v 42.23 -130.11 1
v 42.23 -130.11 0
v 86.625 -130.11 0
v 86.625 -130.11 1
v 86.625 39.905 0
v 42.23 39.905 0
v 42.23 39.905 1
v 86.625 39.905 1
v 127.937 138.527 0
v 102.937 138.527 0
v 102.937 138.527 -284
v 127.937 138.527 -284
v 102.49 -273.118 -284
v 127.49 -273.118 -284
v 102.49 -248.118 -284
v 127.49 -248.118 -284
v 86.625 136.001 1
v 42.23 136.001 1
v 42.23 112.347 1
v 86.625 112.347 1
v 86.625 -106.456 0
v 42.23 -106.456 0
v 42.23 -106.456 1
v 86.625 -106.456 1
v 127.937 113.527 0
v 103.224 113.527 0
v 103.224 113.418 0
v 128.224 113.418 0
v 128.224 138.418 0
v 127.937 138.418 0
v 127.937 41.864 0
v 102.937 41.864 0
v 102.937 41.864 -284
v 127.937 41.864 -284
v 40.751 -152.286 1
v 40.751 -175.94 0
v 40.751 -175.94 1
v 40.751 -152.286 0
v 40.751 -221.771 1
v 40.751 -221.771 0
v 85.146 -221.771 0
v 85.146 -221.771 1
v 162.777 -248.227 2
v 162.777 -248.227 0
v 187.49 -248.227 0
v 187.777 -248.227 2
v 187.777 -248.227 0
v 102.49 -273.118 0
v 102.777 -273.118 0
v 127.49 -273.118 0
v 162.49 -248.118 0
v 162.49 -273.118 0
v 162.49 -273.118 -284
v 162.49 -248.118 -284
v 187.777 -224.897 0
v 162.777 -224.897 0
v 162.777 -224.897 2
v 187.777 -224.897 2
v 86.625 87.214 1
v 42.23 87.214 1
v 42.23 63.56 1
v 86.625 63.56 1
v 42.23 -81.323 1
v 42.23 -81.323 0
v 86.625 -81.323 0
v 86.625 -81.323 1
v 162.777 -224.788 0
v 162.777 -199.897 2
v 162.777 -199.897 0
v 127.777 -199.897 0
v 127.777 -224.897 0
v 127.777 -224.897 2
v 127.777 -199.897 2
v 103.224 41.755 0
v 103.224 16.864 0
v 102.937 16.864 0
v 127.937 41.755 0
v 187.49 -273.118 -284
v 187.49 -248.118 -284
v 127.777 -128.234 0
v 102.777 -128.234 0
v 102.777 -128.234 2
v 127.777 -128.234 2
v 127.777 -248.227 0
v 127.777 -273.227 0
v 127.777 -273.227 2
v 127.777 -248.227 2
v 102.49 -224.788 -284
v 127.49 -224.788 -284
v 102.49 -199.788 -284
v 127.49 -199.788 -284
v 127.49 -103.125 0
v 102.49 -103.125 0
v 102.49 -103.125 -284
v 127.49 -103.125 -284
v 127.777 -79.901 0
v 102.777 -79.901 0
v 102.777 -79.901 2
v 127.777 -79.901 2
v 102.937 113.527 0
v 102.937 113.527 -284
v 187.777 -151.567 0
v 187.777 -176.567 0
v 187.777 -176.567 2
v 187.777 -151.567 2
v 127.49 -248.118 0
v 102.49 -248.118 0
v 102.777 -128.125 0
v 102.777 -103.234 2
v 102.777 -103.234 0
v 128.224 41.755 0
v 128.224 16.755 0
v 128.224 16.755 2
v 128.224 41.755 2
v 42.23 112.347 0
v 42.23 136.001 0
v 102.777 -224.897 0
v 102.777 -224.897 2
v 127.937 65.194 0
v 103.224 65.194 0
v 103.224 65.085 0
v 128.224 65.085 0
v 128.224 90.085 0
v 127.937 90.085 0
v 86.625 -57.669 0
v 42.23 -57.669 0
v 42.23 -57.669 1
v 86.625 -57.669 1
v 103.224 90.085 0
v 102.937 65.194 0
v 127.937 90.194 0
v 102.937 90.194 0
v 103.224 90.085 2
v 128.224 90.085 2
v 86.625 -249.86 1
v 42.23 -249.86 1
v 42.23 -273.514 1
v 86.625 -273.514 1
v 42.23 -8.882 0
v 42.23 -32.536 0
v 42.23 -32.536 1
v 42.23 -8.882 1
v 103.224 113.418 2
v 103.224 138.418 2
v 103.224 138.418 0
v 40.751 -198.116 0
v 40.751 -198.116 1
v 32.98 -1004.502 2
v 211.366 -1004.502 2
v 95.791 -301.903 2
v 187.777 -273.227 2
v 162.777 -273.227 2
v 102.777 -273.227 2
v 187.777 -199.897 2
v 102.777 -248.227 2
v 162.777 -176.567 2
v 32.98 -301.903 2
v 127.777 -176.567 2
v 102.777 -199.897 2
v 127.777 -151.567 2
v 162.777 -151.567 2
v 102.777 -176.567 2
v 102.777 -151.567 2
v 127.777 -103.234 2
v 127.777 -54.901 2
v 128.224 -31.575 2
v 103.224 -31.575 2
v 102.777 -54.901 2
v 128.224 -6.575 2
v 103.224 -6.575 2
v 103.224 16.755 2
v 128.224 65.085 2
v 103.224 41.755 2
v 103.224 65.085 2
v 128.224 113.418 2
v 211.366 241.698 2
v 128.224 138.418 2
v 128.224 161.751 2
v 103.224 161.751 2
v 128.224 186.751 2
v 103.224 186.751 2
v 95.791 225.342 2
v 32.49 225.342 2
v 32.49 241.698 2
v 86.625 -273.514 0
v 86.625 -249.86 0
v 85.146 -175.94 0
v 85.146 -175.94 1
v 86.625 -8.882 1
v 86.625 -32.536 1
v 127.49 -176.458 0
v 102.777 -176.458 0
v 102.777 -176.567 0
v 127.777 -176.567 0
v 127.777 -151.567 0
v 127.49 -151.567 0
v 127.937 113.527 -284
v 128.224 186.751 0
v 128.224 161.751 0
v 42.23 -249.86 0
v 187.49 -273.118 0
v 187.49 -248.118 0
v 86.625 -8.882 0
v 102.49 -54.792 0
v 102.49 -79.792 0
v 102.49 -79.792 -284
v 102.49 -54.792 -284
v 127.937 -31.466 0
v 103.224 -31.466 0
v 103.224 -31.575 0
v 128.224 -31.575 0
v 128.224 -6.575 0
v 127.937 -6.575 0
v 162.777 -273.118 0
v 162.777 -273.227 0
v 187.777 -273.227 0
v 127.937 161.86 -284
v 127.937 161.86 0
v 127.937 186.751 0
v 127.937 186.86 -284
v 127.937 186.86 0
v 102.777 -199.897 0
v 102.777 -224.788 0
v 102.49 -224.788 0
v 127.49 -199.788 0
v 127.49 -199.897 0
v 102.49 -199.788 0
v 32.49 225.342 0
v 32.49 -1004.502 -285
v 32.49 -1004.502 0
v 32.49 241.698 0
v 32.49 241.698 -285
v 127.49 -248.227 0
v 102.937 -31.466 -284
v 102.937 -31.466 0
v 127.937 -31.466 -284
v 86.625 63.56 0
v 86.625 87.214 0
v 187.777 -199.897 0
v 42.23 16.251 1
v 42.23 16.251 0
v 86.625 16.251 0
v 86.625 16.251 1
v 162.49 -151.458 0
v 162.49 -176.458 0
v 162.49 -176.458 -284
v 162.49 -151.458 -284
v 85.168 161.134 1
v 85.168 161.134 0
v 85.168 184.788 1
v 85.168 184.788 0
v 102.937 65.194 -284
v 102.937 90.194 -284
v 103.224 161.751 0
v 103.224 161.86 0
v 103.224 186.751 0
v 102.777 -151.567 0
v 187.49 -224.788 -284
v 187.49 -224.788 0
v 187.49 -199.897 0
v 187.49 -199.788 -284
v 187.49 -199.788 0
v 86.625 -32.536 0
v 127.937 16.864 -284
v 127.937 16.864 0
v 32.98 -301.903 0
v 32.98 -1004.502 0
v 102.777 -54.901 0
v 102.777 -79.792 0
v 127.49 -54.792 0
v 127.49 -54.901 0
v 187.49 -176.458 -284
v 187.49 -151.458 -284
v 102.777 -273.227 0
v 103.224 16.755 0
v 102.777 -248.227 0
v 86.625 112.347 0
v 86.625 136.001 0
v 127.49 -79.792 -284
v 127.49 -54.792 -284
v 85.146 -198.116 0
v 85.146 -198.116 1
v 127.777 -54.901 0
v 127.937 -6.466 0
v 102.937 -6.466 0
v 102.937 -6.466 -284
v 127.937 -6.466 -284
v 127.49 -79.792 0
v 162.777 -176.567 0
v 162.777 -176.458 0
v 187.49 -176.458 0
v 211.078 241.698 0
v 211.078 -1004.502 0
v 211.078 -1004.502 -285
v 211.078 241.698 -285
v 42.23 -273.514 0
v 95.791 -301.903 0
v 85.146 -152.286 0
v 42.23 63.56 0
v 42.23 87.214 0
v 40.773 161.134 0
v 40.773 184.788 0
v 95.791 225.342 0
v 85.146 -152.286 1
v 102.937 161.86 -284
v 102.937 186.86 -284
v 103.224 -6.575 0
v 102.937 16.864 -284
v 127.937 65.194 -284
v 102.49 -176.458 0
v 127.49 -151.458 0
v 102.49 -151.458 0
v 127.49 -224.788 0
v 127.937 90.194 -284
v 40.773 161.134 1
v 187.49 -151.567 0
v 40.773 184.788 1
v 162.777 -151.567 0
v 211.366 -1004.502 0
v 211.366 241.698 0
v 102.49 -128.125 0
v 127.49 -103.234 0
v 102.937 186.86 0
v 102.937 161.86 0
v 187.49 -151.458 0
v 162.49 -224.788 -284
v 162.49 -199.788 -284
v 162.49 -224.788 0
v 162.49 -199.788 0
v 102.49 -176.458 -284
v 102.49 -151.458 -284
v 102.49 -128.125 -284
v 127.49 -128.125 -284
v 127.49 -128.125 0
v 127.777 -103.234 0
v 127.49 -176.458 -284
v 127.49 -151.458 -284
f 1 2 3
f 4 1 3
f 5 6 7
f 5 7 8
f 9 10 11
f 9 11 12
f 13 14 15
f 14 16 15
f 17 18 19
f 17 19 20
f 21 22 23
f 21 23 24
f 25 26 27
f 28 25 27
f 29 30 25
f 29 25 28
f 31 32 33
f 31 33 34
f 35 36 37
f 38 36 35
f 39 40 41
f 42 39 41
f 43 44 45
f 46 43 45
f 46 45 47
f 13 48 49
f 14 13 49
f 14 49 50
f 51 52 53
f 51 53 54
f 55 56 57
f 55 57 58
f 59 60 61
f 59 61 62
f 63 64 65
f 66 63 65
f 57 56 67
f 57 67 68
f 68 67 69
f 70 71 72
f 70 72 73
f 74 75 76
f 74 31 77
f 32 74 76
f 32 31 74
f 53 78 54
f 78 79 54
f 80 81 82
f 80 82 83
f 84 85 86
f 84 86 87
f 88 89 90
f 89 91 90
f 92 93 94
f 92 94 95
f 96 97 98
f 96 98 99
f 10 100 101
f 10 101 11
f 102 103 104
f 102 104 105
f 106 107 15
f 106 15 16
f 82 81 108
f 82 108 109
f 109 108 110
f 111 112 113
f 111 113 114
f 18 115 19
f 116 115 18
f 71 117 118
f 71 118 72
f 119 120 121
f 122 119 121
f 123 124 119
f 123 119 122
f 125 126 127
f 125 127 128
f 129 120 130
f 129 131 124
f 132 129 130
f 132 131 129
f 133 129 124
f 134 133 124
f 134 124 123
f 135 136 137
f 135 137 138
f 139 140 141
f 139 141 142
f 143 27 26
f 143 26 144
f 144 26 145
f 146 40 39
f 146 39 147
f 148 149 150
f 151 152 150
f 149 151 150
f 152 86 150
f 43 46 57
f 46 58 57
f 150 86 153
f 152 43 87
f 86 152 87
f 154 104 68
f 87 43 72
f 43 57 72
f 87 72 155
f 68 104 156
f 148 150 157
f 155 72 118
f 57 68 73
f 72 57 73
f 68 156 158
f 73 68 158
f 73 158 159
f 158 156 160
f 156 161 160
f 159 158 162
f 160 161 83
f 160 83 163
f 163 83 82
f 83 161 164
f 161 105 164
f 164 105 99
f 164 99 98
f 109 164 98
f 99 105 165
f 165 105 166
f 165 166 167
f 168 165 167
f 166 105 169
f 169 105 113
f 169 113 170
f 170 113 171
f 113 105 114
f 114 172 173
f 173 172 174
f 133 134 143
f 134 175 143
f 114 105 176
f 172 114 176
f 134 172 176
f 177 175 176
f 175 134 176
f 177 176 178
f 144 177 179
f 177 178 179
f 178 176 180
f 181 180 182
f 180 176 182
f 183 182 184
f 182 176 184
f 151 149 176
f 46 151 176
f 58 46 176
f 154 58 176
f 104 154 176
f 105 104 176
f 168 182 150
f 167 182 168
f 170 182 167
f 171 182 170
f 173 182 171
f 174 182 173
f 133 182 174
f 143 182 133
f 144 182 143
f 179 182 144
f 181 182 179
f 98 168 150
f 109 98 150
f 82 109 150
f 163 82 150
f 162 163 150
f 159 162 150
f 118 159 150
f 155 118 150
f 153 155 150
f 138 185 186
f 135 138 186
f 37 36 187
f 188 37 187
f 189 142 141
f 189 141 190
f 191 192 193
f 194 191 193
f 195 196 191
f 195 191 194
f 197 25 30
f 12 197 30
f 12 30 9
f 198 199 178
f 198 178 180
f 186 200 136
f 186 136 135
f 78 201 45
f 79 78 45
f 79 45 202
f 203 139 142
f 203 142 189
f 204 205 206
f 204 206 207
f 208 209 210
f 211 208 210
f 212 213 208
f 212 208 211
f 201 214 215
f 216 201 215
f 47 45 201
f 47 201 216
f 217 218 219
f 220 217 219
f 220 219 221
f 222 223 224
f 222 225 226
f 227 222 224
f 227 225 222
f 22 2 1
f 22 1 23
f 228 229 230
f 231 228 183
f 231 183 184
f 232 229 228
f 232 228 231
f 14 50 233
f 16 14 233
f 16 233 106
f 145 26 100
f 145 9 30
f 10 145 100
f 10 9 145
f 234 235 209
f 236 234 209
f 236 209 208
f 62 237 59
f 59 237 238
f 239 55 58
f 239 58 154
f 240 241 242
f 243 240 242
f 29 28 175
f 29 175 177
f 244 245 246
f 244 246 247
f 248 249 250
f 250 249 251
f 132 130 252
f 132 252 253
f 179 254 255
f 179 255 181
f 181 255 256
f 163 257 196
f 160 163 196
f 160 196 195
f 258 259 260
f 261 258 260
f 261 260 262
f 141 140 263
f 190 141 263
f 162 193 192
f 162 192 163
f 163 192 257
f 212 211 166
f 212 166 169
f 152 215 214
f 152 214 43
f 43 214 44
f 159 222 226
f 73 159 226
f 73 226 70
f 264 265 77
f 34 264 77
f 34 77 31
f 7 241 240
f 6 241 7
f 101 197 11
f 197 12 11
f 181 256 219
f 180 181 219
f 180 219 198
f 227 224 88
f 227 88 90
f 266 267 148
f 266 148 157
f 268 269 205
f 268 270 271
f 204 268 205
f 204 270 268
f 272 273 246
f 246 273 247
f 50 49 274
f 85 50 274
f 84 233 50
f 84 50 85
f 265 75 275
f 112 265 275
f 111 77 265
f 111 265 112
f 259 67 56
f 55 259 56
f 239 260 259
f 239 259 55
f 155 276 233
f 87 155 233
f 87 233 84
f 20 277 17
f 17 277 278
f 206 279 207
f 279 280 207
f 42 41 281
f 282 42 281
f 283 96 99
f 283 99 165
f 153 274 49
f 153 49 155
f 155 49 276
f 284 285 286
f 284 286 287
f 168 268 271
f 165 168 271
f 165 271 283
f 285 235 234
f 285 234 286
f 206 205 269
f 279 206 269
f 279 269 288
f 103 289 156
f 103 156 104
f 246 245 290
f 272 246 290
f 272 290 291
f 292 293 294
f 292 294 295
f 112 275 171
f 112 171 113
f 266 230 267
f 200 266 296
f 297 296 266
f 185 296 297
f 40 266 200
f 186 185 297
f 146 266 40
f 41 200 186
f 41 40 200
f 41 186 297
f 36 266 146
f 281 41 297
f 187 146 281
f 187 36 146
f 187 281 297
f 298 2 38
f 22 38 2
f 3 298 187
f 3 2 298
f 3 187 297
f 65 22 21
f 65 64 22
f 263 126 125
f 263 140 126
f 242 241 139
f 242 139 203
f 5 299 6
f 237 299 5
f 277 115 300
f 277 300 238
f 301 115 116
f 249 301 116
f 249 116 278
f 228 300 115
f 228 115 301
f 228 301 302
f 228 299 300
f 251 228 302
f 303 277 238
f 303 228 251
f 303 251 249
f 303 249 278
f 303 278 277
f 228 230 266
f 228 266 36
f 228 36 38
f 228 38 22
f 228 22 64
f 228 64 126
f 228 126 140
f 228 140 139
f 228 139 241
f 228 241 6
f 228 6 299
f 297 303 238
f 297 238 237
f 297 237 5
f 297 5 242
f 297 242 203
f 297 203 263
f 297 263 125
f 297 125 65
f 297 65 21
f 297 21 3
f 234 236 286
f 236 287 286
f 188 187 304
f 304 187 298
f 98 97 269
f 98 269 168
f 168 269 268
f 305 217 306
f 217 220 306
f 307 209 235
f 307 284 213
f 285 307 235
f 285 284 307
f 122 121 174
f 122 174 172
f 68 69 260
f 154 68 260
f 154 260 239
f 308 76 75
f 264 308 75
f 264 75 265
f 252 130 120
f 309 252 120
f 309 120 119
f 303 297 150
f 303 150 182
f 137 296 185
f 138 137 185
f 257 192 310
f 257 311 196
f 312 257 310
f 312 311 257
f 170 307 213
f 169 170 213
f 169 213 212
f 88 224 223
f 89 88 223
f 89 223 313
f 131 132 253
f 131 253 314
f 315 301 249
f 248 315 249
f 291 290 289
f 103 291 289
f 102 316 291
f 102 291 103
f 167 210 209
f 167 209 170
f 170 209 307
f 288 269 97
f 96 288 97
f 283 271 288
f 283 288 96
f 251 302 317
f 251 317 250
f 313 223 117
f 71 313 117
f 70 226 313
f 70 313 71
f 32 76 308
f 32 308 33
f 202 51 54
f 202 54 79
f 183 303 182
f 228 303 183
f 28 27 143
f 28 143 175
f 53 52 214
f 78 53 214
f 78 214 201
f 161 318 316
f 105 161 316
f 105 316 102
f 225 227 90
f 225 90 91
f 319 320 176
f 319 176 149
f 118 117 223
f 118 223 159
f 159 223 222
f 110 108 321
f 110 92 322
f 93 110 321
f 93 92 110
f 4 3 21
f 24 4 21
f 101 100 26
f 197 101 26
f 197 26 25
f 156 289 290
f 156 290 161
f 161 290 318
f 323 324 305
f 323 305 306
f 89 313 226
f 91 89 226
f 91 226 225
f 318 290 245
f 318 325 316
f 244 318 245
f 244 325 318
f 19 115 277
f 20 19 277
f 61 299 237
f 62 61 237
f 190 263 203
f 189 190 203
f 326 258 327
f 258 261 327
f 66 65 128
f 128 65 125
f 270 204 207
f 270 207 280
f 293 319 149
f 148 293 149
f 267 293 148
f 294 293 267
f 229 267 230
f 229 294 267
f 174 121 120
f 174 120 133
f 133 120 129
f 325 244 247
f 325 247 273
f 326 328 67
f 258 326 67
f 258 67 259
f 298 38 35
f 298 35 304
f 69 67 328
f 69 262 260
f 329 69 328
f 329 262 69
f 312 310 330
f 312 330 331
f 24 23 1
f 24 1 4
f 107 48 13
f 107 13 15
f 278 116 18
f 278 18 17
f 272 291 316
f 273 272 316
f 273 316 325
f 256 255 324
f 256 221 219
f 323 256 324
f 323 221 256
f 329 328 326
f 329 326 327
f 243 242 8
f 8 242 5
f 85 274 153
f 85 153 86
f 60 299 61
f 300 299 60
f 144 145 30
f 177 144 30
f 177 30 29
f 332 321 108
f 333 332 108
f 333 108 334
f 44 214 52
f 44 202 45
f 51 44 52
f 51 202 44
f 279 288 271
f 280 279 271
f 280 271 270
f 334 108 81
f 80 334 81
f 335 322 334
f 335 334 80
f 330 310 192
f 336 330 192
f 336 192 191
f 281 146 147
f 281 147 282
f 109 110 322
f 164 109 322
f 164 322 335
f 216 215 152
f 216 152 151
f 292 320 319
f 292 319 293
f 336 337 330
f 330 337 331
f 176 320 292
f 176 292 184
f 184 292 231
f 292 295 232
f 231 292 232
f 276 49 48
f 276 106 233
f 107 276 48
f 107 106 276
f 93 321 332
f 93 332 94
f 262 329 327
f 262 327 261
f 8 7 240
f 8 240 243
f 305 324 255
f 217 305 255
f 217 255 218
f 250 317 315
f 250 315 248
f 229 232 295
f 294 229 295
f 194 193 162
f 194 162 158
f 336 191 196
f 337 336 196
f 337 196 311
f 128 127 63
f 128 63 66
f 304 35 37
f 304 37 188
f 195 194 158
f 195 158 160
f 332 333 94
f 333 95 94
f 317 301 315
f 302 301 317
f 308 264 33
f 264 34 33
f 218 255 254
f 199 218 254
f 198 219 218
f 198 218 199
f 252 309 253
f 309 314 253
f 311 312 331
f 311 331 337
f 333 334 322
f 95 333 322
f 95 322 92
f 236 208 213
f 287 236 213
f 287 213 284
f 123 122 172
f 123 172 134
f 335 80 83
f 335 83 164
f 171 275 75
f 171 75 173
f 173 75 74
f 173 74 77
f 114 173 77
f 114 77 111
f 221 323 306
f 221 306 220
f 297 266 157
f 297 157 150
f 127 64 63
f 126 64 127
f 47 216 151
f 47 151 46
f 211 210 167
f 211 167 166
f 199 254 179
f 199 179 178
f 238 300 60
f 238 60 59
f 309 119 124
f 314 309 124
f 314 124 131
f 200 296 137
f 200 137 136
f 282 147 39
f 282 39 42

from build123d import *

# Parameters (mm, degrees)
CROQUIS1_W              = 178.587886288
CROQUIS1_H              = 1246.200179681
CROQUIS1_W_2            = 25
CROQUIS1_H_2            = 25
SALIENTE_EXTRUIR2_DEPTH = 285
CROQUIS2_W              = 178.587886288
CROQUIS2_H              = 550.793515283
SALIENTE_EXTRUIR3_DEPTH = 1
CROQUIS5_W              = 25
CROQUIS5_H              = 25
SALIENTE_EXTRUIR4_DEPTH = 2
CROQUIS10_W             = 44.39506519
CROQUIS10_H             = 23.654322963
CROQUIS10_H_2           = 23.654322964
SALIENTE_EXTRUIR5_DEPTH = 1


with BuildPart() as part:
    # Croquis1 → Saliente-Extruir2 (new body)
    with BuildSketch(Plane.XY):
        with Locations((121.784181129, -381.401832721)):
            Rectangle(CROQUIS1_W, CROQUIS1_H)
        with Locations((115.437079382, 174.360479256)):
            Rectangle(CROQUIS1_W_2, CROQUIS1_H_2, mode=Mode.SUBTRACT)
        with Locations((174.990237985, -163.957841157)):
            Rectangle(CROQUIS1_W_2, CROQUIS1_H_2, mode=Mode.SUBTRACT)
        with Locations((115.437079382, 126.027179256)):
            Rectangle(CROQUIS1_W_2, CROQUIS1_H_2, mode=Mode.SUBTRACT)
        with Locations((115.437079382, 77.694179256)):
            Rectangle(CROQUIS1_W_2, CROQUIS1_H_2, mode=Mode.SUBTRACT)
        with Locations((115.437079382, 29.364179256)):
            Rectangle(CROQUIS1_W_2, CROQUIS1_H_2, mode=Mode.SUBTRACT)
        with Locations((115.437079382, -18.965820744)):
            Rectangle(CROQUIS1_W_2, CROQUIS1_H_2, mode=Mode.SUBTRACT)
        with Locations((114.990237985, -67.291541157)):
            Rectangle(CROQUIS1_W_2, CROQUIS1_H_2, mode=Mode.SUBTRACT)
        with Locations((114.990237985, -115.624841157)):
            Rectangle(CROQUIS1_W_2, CROQUIS1_H_2, mode=Mode.SUBTRACT)
        with Locations((114.990237985, -163.957841157)):
            Rectangle(CROQUIS1_W_2, CROQUIS1_H_2, mode=Mode.SUBTRACT)
        with Locations((114.990237985, -212.287841157)):
            Rectangle(CROQUIS1_W_2, CROQUIS1_H_2, mode=Mode.SUBTRACT)
        with Locations((114.990237985, -260.617841157)):
            Rectangle(CROQUIS1_W_2, CROQUIS1_H_2, mode=Mode.SUBTRACT)
        with Locations((174.990237985, -212.287841157)):
            Rectangle(CROQUIS1_W_2, CROQUIS1_H_2, mode=Mode.SUBTRACT)
        with Locations((174.990237985, -260.617841157)):
            Rectangle(CROQUIS1_W_2, CROQUIS1_H_2, mode=Mode.SUBTRACT)
    extrude(amount=-SALIENTE_EXTRUIR2_DEPTH)

    # Croquis2 → Saliente-Extruir3 (add)
    with BuildSketch(Plane(origin=(0, 0, -285), x_dir=(-1, 0, 0), z_dir=(0, 0, -1))):
        with Locations((-121.784181129, -33.698500522)):
            Rectangle(CROQUIS2_W, CROQUIS2_H)
    extrude(amount=-SALIENTE_EXTRUIR3_DEPTH)

    # Croquis5 → Saliente-Extruir4 (add)
    with BuildSketch(Plane.XY):
        Polygon((40.133927115, 241.69825712), (187.776914698, 241.69825712), (211.365707843, 241.69825712), (211.365707843, -1004.501922561), (32.980151612, -1004.501922561), (32.980151612, -301.90284108), (95.791395616, -301.90284108), (95.791395616, 225.342265798), (32.490237985, 225.342265798), (32.490237985, 241.69825712), align=None)
        with Locations((115.723756094, 174.251217897)):
            Rectangle(CROQUIS5_W, CROQUIS5_H, mode=Mode.SUBTRACT)
        with Locations((175.276914698, -164.067102515)):
            Rectangle(CROQUIS5_W, CROQUIS5_H, mode=Mode.SUBTRACT)
        with Locations((115.723756094, 125.917917897)):
            Rectangle(CROQUIS5_W, CROQUIS5_H, mode=Mode.SUBTRACT)
        with Locations((115.723756094, 77.584917897)):
            Rectangle(CROQUIS5_W, CROQUIS5_H, mode=Mode.SUBTRACT)
        with Locations((115.723756094, 29.254917897)):
            Rectangle(CROQUIS5_W, CROQUIS5_H, mode=Mode.SUBTRACT)
        with Locations((115.723756094, -19.075082103)):
            Rectangle(CROQUIS5_W, CROQUIS5_H, mode=Mode.SUBTRACT)
        with Locations((115.276914698, -67.400802515)):
            Rectangle(CROQUIS5_W, CROQUIS5_H, mode=Mode.SUBTRACT)
        with Locations((115.276914698, -115.734102515)):
            Rectangle(CROQUIS5_W, CROQUIS5_H, mode=Mode.SUBTRACT)
        with Locations((115.276914698, -164.067102515)):
            Rectangle(CROQUIS5_W, CROQUIS5_H, mode=Mode.SUBTRACT)
        with Locations((115.276914698, -212.397102515)):
            Rectangle(CROQUIS5_W, CROQUIS5_H, mode=Mode.SUBTRACT)
        with Locations((115.276914698, -260.727102515)):
            Rectangle(CROQUIS5_W, CROQUIS5_H, mode=Mode.SUBTRACT)
        with Locations((175.276914698, -212.397102515)):
            Rectangle(CROQUIS5_W, CROQUIS5_H, mode=Mode.SUBTRACT)
        with Locations((175.276914698, -260.727102515)):
            Rectangle(CROQUIS5_W, CROQUIS5_H, mode=Mode.SUBTRACT)
    extrude(amount=SALIENTE_EXTRUIR4_DEPTH)

    # Croquis10 → Saliente-Extruir5 (add)
    with BuildSketch(Plane.XY):
        with Locations((62.970480914, 172.960872416)):
            Rectangle(CROQUIS10_W, CROQUIS10_H)
        with Locations((64.427271282, 75.386790193)):
            Rectangle(CROQUIS10_W, CROQUIS10_H_2)
        with Locations((64.427271282, -20.708896845)):
            Rectangle(CROQUIS10_W, CROQUIS10_H)
        with Locations((64.427271282, -69.495937956)):
            Rectangle(CROQUIS10_W, CROQUIS10_H)
        with Locations((64.427271282, -118.282979068)):
            Rectangle(CROQUIS10_W, CROQUIS10_H)
        with Locations((62.948876097, -164.113229809)):
            Rectangle(CROQUIS10_W, CROQUIS10_H)
        with Locations((62.948876097, -209.94348055)):
            Rectangle(CROQUIS10_W, CROQUIS10_H)
        with Locations((64.427271282, 28.078144267)):
            Rectangle(CROQUIS10_W, CROQUIS10_H)
        with Locations((64.427271282, 124.173831305)):
            Rectangle(CROQUIS10_W, CROQUIS10_H)
        with Locations((64.427271282, -261.687312031)):
            Rectangle(CROQUIS10_W, CROQUIS10_H_2)
    extrude(amount=SALIENTE_EXTRUIR5_DEPTH)


solid = part.part
